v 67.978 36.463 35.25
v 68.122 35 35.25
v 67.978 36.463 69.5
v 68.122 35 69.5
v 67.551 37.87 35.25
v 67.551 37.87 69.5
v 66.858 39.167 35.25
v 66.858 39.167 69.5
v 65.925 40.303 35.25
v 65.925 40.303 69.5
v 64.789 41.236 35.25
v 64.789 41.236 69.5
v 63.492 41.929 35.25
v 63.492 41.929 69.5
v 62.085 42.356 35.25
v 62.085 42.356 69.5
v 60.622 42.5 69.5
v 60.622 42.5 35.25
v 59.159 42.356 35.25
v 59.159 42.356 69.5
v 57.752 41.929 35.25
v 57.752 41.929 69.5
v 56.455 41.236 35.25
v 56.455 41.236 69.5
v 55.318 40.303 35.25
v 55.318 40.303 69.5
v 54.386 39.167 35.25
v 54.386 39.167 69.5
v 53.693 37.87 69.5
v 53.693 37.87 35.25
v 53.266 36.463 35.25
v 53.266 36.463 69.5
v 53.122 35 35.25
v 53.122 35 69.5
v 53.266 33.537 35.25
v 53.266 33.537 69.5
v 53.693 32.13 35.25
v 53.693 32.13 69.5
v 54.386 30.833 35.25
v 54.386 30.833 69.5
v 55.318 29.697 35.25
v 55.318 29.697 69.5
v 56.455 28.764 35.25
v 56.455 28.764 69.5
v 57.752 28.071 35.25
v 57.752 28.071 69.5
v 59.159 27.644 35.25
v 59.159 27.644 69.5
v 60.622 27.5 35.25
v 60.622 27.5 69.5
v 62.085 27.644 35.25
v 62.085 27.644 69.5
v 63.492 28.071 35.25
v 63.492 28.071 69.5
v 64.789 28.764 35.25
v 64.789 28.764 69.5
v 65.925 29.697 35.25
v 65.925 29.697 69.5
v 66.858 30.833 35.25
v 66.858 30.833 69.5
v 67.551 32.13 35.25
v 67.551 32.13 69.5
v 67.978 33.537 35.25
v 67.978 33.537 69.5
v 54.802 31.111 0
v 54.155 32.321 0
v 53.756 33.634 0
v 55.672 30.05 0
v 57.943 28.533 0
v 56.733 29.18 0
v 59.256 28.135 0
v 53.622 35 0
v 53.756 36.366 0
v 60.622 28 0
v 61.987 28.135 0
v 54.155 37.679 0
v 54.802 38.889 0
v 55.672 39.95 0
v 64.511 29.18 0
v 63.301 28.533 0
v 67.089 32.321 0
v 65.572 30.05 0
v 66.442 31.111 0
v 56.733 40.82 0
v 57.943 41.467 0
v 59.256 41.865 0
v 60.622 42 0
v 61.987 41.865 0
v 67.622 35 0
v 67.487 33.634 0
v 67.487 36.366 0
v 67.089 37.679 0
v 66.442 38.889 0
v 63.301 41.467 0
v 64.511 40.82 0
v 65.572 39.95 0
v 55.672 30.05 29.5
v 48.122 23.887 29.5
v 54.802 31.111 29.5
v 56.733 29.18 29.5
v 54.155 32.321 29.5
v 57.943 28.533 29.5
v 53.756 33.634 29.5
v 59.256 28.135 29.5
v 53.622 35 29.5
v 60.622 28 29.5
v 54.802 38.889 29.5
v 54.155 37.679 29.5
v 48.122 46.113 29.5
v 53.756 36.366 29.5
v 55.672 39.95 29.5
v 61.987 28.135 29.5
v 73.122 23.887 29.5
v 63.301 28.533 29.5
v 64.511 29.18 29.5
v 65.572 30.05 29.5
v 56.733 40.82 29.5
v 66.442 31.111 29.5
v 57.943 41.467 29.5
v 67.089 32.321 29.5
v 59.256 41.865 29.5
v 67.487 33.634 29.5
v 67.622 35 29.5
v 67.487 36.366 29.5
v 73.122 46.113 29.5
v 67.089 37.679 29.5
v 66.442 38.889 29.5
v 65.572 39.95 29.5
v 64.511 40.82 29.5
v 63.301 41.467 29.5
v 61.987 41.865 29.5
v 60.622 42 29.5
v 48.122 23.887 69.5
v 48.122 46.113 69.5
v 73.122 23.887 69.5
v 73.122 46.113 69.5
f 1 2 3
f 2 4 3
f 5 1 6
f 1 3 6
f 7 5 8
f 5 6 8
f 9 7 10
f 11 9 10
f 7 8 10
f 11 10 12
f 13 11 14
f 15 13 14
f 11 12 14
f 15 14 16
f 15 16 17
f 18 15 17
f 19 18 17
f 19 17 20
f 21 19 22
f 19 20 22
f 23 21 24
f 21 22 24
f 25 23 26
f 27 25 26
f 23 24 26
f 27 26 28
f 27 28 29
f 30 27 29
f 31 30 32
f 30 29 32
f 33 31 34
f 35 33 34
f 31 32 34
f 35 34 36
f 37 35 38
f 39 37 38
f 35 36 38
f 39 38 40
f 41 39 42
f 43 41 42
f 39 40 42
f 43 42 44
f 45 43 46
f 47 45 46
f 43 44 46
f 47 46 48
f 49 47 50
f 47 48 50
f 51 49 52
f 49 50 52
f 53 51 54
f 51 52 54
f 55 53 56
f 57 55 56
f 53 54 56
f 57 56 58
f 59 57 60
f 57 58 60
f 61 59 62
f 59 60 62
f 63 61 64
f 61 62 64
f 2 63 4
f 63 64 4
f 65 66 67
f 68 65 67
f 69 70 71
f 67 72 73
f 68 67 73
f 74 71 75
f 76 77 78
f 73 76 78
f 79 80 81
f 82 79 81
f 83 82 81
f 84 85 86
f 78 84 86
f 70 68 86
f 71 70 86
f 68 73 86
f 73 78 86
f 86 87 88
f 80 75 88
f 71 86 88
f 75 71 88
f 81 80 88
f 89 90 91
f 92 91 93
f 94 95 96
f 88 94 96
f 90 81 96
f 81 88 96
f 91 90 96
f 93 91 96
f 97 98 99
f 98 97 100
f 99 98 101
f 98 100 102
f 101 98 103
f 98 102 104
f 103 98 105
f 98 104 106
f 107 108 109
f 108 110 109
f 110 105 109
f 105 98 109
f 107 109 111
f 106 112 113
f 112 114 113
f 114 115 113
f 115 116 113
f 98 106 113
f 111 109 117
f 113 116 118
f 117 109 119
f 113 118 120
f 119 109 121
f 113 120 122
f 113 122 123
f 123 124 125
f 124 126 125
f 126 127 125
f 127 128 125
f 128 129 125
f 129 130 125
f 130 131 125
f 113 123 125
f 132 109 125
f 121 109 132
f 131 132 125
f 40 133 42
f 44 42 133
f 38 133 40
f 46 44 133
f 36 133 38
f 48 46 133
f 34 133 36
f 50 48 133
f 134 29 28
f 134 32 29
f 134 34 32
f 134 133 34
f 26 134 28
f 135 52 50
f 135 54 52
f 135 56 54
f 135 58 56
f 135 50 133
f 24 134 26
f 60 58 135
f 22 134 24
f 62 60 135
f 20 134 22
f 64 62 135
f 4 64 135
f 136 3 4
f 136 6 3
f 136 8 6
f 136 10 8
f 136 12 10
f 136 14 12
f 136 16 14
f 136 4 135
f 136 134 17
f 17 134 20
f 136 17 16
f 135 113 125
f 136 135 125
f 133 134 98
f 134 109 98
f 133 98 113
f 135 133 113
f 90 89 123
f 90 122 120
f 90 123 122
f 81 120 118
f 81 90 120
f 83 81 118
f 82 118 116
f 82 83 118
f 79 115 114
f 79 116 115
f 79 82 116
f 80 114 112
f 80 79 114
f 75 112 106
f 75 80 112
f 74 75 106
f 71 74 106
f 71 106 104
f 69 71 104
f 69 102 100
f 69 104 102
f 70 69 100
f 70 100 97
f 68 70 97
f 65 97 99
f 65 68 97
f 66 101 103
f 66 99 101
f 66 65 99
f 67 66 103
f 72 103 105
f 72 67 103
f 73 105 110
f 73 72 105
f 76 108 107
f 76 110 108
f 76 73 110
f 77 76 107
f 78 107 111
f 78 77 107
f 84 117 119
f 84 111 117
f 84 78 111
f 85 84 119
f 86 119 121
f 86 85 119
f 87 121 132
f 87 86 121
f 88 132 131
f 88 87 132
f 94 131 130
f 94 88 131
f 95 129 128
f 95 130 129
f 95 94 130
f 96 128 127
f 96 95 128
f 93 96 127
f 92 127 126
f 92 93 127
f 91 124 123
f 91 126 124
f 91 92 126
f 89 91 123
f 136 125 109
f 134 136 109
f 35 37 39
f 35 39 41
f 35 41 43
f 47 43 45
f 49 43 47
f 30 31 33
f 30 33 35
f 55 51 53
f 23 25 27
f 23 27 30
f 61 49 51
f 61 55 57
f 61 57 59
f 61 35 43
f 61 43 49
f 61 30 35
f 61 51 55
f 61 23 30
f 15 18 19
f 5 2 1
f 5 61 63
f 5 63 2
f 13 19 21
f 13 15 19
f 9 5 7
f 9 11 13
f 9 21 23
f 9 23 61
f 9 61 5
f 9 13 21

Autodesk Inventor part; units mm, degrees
ref_plane "YZ Plane" through (0, 0, 0) normal (1, 0, 0) x (0, 1, 0)
ref_plane "XZ Plane" through (0, 0, 0) normal (0, 1, 0) x (-1, 0, 0)
ref_plane "XY Plane" through (0, 0, 0) normal (0, 0, 1) x (1, 0, 0)
sketch "Эскиз1" plane through (0, 0, 0) normal (0, 0, 1) x (1, 0, 0)
  circle A0 centre (60.6218, 35) radius 7.5 projected
  circle A1 centre (60.6218, 35) radius 7
  point P0 (0, 0)
  dimension "d0" = 14
extrude "Выдавливание1" add sketch "Эскиз1" along normal blind 29.5 contours A1
sketch "Эскиз2" plane through (60.6218, 35, 29.5) normal (0, 0, 1) x (1, 0, 0)
  line L0 (12.5, 11.1132) -> (-12.5, 11.1132)
  line L1 (-12.5, 11.1132) -> (-12.5, -11.1132)
  line L2 (-12.5, -11.1132) -> (12.5, -11.1132)
  line L3 (12.5, -11.1132) -> (12.5, 11.1132)
  line L4 (12.5, 11.1132) -> (-12.5, -11.1132) construction
  line L5 (-12.5, 11.1132) -> (12.5, -11.1132) construction
  point P0 (-60.6218, -35)
  point P1 (0, 0)
  dimension "d3" = 25
extrude "Выдавливание2" add sketch "Эскиз2" along normal blind 40
sketch "Эскиз3" plane through (60.6218, 35, 69.5) normal (0, 0, 1) x (1, 0, 0)
  circle A0 centre (0, 0) radius 7.5
  point P0 (-60.6218, -35)
  dimension "d6" = 15
extrude "Выдавливание3" cut sketch "Эскиз3" against normal blind 34.25
properties part number "Гайка"
